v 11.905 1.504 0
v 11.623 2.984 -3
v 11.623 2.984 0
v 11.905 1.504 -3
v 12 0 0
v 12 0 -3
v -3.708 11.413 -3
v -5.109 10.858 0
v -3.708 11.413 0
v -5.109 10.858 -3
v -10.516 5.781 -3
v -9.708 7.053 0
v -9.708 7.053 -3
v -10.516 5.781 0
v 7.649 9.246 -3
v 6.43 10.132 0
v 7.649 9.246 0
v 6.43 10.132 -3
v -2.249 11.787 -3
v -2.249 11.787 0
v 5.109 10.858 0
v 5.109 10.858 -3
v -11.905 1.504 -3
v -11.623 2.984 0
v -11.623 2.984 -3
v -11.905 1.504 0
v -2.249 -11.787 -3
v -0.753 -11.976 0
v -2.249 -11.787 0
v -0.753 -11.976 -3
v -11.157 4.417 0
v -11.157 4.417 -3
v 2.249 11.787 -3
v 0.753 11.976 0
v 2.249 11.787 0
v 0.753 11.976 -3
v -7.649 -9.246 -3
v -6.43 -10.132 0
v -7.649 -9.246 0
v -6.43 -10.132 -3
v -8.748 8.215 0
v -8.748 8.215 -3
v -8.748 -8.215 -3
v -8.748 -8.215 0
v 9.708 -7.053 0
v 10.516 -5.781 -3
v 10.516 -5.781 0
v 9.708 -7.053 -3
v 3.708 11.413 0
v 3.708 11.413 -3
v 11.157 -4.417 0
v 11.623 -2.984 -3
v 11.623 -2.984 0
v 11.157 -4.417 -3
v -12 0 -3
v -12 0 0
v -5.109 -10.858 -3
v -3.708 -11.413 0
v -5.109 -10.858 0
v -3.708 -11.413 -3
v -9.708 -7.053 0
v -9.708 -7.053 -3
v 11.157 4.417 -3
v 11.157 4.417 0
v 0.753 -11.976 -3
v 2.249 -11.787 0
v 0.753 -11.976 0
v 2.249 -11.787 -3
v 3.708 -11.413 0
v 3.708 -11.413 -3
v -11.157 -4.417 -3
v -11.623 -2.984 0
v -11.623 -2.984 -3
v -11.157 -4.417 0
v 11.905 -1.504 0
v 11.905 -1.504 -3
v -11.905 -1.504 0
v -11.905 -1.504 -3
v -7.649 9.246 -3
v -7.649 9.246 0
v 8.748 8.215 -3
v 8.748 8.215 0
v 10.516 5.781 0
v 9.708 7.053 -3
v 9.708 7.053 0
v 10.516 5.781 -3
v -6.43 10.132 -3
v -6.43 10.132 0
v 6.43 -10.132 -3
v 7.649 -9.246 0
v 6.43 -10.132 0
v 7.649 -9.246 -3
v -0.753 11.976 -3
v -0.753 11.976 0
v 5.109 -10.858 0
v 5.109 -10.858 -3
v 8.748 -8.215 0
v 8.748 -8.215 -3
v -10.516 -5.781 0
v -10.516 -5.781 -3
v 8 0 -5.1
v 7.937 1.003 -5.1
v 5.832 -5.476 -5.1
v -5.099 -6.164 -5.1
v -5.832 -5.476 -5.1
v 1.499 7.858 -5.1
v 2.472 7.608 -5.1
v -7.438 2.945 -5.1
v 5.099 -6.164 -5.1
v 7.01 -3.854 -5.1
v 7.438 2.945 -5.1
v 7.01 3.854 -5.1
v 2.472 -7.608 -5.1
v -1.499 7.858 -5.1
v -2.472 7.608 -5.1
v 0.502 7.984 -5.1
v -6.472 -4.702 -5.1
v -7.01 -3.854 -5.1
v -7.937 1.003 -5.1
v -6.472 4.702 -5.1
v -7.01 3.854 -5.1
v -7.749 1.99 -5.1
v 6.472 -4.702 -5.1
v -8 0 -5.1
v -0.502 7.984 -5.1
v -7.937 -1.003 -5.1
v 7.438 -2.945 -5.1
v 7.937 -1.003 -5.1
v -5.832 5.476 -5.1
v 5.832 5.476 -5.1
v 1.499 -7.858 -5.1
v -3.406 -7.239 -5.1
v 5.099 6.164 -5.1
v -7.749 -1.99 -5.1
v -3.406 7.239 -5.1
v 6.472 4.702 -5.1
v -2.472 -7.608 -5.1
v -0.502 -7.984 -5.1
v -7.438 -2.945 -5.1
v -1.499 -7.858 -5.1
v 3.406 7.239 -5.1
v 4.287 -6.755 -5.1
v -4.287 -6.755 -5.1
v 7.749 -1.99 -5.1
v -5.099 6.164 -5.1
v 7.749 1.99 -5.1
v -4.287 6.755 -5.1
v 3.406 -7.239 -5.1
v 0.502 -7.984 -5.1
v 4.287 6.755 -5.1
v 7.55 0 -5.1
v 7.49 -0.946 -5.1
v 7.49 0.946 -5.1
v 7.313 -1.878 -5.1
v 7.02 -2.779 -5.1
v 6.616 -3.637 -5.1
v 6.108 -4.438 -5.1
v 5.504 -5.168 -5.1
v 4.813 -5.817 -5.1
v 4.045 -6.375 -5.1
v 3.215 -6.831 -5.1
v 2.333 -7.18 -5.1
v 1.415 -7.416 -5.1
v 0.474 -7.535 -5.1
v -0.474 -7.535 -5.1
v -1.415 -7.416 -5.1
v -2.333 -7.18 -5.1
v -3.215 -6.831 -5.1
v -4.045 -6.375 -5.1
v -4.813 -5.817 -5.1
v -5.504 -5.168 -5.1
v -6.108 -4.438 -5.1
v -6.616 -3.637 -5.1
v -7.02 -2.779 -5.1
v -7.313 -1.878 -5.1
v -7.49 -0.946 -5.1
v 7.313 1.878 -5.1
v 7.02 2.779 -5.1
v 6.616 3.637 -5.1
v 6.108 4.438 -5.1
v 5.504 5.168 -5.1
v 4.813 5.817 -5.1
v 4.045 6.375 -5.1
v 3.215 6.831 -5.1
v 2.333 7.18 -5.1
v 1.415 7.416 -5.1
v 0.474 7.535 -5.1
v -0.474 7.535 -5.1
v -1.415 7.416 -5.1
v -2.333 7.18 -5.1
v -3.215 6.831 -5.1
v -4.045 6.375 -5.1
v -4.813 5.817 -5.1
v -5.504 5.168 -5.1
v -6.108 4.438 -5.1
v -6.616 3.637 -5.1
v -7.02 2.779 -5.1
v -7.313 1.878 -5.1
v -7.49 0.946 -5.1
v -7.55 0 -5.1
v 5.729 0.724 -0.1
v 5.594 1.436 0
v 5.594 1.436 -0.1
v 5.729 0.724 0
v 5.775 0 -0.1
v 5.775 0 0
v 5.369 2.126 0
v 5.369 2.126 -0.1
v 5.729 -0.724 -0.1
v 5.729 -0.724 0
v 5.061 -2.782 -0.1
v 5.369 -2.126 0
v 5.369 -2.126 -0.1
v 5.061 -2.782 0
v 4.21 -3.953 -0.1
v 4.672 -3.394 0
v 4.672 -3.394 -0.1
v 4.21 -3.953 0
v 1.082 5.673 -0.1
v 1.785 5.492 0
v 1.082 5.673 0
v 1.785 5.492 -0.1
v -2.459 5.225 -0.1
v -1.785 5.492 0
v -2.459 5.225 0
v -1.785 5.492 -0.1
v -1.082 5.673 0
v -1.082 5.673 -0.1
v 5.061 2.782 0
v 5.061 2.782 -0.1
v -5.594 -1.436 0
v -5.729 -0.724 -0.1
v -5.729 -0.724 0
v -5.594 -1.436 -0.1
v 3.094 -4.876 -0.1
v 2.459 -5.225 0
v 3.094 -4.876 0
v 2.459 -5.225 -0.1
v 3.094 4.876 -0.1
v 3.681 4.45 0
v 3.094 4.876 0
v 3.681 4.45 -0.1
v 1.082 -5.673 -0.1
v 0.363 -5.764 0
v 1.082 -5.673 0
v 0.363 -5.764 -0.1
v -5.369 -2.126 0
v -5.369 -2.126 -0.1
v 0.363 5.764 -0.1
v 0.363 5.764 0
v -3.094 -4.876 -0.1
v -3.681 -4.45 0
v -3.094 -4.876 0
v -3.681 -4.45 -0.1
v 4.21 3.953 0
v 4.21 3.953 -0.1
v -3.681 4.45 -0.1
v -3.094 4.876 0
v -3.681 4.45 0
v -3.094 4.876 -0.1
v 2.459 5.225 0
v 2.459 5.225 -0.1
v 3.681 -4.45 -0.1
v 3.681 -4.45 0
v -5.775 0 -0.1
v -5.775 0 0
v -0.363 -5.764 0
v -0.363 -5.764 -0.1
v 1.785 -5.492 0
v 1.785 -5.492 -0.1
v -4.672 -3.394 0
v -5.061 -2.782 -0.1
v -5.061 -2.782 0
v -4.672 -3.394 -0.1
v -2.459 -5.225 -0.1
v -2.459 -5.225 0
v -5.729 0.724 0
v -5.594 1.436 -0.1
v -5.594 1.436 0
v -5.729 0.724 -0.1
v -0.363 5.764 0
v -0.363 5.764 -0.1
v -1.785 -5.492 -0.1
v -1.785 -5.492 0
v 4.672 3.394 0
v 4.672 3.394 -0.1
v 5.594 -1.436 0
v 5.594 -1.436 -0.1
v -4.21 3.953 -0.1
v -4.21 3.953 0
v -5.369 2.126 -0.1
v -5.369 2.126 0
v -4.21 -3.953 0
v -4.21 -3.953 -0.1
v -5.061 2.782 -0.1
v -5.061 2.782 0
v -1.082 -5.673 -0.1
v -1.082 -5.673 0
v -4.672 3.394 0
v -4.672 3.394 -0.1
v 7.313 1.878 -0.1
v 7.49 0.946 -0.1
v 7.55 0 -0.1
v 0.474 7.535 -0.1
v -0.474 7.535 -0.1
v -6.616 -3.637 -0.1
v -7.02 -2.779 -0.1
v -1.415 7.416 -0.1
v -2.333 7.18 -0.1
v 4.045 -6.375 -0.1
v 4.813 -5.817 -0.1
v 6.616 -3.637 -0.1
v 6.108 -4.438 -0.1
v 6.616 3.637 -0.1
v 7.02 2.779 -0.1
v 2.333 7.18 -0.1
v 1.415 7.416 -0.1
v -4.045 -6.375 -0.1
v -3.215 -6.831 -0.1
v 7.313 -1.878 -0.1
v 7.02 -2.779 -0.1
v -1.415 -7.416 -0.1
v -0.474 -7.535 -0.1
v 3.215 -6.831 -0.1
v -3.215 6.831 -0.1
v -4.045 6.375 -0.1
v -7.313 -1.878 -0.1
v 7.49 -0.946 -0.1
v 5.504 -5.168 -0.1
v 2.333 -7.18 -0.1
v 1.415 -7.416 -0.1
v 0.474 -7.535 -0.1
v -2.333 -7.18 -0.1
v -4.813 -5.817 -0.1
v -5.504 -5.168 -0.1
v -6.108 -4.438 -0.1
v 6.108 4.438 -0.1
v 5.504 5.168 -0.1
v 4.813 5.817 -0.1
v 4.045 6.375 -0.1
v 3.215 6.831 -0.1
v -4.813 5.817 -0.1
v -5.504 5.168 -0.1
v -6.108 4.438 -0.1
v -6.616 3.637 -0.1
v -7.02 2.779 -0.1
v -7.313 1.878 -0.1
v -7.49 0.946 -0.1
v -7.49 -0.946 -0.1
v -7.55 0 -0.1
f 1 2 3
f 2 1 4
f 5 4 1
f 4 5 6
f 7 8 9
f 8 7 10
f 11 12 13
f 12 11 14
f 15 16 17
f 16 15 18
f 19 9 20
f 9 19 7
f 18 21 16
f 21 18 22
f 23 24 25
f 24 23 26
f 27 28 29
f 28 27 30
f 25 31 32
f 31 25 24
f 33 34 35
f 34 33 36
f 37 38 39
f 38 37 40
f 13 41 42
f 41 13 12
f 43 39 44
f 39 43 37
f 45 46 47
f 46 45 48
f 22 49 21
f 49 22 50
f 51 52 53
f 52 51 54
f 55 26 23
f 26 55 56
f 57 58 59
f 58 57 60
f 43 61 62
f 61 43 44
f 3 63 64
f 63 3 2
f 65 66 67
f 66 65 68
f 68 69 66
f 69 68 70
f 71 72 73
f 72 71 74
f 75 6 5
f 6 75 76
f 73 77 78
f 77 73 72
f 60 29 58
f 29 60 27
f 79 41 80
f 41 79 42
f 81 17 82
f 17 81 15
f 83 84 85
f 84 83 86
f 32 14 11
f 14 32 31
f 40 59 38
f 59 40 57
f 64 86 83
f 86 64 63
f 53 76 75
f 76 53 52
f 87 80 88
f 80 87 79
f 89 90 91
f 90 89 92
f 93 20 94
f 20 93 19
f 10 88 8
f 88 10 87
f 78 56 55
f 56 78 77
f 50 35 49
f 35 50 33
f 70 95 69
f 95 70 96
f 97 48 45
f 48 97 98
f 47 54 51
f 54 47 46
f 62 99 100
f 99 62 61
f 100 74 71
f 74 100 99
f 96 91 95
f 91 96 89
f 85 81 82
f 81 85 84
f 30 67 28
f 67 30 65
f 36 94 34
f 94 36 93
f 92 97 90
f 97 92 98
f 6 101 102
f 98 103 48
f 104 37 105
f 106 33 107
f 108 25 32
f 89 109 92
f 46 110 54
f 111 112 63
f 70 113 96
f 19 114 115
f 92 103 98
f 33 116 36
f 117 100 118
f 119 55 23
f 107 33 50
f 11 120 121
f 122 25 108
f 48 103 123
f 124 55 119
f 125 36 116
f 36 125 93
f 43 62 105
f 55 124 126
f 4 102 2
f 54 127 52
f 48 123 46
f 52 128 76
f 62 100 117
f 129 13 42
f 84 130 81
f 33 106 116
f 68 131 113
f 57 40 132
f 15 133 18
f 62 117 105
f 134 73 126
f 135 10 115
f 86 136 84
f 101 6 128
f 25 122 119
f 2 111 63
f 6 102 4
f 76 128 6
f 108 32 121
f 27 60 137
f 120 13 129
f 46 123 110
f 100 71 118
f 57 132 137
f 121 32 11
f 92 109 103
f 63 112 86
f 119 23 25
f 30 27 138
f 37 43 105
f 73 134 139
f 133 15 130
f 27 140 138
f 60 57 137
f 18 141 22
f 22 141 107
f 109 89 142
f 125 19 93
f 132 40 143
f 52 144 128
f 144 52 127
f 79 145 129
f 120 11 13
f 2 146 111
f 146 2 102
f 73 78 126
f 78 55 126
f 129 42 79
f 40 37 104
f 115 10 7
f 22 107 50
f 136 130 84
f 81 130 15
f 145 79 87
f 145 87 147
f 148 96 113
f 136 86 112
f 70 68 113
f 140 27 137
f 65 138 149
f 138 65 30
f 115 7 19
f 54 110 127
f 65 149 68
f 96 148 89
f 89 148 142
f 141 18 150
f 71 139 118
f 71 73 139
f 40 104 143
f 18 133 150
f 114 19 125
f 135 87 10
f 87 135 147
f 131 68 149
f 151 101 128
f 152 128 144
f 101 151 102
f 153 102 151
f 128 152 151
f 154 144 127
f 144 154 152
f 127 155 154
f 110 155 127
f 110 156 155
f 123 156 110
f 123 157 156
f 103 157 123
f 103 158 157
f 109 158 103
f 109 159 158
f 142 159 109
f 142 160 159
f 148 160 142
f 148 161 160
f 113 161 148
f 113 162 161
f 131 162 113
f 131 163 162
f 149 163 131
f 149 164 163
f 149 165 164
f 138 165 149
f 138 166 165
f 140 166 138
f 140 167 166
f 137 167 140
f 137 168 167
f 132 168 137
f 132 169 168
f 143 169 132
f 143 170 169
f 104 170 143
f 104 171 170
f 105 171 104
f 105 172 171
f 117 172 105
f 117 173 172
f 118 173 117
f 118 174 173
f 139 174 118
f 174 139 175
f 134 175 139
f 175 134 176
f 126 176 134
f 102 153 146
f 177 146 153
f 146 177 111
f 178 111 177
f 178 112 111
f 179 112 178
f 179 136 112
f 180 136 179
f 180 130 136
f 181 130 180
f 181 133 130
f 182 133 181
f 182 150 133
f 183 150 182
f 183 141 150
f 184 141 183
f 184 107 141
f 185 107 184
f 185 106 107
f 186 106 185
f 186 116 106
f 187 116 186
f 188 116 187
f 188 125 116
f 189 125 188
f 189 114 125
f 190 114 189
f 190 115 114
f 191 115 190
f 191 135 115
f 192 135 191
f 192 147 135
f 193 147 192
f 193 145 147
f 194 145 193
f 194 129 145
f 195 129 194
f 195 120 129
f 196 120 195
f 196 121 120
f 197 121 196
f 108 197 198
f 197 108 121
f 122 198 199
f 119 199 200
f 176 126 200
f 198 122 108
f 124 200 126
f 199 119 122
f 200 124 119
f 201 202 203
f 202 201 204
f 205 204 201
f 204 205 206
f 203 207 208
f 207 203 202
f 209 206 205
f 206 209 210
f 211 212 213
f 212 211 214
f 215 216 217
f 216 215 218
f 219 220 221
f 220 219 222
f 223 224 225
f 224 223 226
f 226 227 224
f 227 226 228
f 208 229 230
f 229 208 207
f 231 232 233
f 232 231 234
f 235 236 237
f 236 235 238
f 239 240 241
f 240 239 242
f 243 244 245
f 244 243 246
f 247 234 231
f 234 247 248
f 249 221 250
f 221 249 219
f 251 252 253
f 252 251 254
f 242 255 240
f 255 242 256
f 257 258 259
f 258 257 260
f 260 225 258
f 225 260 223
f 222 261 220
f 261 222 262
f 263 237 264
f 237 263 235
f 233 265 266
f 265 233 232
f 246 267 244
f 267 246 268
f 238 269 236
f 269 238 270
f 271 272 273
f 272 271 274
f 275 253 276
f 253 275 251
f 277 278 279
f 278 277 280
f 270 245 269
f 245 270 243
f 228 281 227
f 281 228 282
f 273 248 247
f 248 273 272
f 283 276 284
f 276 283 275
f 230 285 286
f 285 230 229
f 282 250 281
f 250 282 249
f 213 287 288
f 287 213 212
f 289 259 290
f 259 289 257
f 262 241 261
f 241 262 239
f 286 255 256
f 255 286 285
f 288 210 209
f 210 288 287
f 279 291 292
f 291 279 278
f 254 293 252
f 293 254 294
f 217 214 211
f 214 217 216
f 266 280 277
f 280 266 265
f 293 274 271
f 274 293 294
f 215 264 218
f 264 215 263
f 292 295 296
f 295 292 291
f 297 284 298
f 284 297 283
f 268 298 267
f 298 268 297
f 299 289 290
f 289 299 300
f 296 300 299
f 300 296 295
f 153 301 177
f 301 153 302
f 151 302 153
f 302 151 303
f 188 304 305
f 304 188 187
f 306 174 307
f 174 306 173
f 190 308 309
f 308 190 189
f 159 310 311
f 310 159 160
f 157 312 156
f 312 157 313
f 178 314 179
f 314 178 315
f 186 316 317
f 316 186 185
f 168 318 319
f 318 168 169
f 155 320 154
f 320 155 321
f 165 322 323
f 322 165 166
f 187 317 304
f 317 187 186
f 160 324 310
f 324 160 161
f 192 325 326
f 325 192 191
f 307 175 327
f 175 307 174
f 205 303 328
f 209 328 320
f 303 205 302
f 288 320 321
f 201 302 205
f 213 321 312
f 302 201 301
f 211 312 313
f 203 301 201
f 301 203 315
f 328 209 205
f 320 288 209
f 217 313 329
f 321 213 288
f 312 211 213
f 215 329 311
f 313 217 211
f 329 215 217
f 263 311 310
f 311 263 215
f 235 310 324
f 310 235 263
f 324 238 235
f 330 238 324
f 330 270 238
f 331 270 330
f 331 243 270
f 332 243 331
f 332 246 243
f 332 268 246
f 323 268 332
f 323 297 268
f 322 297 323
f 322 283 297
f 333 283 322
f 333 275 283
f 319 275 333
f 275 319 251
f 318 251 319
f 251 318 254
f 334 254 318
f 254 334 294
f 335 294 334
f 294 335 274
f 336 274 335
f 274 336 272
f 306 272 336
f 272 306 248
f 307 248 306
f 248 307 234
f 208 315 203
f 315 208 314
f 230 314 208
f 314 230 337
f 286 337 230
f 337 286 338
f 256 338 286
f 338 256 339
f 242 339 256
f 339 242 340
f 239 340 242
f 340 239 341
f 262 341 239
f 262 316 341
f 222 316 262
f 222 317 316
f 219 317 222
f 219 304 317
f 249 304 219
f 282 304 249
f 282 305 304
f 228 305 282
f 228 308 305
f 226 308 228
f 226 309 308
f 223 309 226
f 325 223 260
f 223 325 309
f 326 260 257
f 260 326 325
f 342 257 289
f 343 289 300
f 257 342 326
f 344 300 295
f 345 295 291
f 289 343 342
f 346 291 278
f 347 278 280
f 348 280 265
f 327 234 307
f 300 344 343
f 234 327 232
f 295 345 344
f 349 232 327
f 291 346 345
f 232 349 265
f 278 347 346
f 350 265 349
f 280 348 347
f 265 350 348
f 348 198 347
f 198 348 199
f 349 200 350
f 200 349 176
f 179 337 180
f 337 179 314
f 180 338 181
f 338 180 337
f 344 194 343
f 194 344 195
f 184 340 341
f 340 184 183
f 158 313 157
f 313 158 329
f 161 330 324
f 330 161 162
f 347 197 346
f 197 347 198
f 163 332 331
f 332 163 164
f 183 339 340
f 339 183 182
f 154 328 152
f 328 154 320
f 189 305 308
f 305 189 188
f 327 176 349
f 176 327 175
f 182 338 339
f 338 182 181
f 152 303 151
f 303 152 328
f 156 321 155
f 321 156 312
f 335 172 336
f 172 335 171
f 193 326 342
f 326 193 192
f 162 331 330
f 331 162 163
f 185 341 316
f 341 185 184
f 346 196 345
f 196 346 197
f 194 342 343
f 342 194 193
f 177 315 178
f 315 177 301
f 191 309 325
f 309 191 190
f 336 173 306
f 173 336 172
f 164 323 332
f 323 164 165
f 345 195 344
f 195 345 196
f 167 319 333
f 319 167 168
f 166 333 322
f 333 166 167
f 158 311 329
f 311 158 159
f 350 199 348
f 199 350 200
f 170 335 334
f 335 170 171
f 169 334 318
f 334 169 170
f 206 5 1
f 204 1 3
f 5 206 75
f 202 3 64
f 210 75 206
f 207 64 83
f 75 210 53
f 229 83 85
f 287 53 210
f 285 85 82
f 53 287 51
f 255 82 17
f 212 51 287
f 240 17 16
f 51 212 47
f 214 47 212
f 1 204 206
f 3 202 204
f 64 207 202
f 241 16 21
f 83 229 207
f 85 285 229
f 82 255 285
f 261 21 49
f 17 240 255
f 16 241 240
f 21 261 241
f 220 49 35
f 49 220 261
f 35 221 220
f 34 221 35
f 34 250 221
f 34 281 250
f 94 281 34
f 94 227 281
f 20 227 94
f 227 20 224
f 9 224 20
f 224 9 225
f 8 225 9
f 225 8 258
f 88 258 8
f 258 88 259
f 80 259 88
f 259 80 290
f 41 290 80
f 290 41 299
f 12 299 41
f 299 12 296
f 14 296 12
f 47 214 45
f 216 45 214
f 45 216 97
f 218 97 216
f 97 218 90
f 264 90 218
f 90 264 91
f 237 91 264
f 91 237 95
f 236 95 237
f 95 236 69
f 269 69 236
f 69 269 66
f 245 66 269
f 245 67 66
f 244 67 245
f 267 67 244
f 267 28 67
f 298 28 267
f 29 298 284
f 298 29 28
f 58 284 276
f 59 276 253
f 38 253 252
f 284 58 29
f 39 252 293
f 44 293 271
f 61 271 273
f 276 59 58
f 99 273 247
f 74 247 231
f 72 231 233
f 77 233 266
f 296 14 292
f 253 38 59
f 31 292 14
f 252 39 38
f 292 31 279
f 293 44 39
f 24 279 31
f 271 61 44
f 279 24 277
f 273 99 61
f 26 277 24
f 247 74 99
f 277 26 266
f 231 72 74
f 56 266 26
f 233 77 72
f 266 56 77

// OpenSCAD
$fn = 50;


difference() {
	union() {
		translate(v = [0, 0, -3.0000000000]) {
			cylinder(h = 6, r = 12.0000000000);
		}
		translate(v = [0, 0, 3.0000000000]) {
			cylinder(h = 2.1000000000, r1 = 12.0000000000, r2 = 8.0000000000);
		}
		translate(v = [0, 0, -5.1000000000]) {
			cylinder(h = 2.1000000000, r1 = 8.0000000000, r2 = 12.0000000000);
		}
	}
	union() {
		translate(v = [0, 0, -100.0000000000]) {
			cylinder(h = 200, r = 5);
		}
		translate(v = [0, 0, 2.6000000000]) {
			translate(v = [0, 0, -2.5000000000]) {
				union() {
					difference() {
						#cylinder(h = 5, r = 7.5500000000);
						#cylinder(h = 5, r = 3.0000000000);
					}
					difference() {
						#translate(v = [0, 0, -50]) {
							cylinder(h = 100, r = 5.7750000000);
						}
					}
				}
			}
		}
		translate(v = [0, 0, -2.6000000000]) {
			translate(v = [0, 0, -2.5000000000]) {
				union() {
					difference() {
						#cylinder(h = 5, r = 7.5500000000);
						#cylinder(h = 5, r = 3.0000000000);
					}
					difference() {
						#translate(v = [0, 0, -50]) {
							cylinder(h = 100, r = 5.7750000000);
						}
					}
				}
			}
		}
		translate(v = [-250.0000000000, -250.0000000000, 0]) {
			cube(size = [500, 500, 500]);
		}
		translate(v = [-250.0000000000, -250.0000000000, 0]) {
			cube(size = [500, 500, 500]);
		}
		translate(v = [-250.0000000000, -250.0000000000, 0]) {
			cube(size = [500, 500, 500]);
		}
	}
}
